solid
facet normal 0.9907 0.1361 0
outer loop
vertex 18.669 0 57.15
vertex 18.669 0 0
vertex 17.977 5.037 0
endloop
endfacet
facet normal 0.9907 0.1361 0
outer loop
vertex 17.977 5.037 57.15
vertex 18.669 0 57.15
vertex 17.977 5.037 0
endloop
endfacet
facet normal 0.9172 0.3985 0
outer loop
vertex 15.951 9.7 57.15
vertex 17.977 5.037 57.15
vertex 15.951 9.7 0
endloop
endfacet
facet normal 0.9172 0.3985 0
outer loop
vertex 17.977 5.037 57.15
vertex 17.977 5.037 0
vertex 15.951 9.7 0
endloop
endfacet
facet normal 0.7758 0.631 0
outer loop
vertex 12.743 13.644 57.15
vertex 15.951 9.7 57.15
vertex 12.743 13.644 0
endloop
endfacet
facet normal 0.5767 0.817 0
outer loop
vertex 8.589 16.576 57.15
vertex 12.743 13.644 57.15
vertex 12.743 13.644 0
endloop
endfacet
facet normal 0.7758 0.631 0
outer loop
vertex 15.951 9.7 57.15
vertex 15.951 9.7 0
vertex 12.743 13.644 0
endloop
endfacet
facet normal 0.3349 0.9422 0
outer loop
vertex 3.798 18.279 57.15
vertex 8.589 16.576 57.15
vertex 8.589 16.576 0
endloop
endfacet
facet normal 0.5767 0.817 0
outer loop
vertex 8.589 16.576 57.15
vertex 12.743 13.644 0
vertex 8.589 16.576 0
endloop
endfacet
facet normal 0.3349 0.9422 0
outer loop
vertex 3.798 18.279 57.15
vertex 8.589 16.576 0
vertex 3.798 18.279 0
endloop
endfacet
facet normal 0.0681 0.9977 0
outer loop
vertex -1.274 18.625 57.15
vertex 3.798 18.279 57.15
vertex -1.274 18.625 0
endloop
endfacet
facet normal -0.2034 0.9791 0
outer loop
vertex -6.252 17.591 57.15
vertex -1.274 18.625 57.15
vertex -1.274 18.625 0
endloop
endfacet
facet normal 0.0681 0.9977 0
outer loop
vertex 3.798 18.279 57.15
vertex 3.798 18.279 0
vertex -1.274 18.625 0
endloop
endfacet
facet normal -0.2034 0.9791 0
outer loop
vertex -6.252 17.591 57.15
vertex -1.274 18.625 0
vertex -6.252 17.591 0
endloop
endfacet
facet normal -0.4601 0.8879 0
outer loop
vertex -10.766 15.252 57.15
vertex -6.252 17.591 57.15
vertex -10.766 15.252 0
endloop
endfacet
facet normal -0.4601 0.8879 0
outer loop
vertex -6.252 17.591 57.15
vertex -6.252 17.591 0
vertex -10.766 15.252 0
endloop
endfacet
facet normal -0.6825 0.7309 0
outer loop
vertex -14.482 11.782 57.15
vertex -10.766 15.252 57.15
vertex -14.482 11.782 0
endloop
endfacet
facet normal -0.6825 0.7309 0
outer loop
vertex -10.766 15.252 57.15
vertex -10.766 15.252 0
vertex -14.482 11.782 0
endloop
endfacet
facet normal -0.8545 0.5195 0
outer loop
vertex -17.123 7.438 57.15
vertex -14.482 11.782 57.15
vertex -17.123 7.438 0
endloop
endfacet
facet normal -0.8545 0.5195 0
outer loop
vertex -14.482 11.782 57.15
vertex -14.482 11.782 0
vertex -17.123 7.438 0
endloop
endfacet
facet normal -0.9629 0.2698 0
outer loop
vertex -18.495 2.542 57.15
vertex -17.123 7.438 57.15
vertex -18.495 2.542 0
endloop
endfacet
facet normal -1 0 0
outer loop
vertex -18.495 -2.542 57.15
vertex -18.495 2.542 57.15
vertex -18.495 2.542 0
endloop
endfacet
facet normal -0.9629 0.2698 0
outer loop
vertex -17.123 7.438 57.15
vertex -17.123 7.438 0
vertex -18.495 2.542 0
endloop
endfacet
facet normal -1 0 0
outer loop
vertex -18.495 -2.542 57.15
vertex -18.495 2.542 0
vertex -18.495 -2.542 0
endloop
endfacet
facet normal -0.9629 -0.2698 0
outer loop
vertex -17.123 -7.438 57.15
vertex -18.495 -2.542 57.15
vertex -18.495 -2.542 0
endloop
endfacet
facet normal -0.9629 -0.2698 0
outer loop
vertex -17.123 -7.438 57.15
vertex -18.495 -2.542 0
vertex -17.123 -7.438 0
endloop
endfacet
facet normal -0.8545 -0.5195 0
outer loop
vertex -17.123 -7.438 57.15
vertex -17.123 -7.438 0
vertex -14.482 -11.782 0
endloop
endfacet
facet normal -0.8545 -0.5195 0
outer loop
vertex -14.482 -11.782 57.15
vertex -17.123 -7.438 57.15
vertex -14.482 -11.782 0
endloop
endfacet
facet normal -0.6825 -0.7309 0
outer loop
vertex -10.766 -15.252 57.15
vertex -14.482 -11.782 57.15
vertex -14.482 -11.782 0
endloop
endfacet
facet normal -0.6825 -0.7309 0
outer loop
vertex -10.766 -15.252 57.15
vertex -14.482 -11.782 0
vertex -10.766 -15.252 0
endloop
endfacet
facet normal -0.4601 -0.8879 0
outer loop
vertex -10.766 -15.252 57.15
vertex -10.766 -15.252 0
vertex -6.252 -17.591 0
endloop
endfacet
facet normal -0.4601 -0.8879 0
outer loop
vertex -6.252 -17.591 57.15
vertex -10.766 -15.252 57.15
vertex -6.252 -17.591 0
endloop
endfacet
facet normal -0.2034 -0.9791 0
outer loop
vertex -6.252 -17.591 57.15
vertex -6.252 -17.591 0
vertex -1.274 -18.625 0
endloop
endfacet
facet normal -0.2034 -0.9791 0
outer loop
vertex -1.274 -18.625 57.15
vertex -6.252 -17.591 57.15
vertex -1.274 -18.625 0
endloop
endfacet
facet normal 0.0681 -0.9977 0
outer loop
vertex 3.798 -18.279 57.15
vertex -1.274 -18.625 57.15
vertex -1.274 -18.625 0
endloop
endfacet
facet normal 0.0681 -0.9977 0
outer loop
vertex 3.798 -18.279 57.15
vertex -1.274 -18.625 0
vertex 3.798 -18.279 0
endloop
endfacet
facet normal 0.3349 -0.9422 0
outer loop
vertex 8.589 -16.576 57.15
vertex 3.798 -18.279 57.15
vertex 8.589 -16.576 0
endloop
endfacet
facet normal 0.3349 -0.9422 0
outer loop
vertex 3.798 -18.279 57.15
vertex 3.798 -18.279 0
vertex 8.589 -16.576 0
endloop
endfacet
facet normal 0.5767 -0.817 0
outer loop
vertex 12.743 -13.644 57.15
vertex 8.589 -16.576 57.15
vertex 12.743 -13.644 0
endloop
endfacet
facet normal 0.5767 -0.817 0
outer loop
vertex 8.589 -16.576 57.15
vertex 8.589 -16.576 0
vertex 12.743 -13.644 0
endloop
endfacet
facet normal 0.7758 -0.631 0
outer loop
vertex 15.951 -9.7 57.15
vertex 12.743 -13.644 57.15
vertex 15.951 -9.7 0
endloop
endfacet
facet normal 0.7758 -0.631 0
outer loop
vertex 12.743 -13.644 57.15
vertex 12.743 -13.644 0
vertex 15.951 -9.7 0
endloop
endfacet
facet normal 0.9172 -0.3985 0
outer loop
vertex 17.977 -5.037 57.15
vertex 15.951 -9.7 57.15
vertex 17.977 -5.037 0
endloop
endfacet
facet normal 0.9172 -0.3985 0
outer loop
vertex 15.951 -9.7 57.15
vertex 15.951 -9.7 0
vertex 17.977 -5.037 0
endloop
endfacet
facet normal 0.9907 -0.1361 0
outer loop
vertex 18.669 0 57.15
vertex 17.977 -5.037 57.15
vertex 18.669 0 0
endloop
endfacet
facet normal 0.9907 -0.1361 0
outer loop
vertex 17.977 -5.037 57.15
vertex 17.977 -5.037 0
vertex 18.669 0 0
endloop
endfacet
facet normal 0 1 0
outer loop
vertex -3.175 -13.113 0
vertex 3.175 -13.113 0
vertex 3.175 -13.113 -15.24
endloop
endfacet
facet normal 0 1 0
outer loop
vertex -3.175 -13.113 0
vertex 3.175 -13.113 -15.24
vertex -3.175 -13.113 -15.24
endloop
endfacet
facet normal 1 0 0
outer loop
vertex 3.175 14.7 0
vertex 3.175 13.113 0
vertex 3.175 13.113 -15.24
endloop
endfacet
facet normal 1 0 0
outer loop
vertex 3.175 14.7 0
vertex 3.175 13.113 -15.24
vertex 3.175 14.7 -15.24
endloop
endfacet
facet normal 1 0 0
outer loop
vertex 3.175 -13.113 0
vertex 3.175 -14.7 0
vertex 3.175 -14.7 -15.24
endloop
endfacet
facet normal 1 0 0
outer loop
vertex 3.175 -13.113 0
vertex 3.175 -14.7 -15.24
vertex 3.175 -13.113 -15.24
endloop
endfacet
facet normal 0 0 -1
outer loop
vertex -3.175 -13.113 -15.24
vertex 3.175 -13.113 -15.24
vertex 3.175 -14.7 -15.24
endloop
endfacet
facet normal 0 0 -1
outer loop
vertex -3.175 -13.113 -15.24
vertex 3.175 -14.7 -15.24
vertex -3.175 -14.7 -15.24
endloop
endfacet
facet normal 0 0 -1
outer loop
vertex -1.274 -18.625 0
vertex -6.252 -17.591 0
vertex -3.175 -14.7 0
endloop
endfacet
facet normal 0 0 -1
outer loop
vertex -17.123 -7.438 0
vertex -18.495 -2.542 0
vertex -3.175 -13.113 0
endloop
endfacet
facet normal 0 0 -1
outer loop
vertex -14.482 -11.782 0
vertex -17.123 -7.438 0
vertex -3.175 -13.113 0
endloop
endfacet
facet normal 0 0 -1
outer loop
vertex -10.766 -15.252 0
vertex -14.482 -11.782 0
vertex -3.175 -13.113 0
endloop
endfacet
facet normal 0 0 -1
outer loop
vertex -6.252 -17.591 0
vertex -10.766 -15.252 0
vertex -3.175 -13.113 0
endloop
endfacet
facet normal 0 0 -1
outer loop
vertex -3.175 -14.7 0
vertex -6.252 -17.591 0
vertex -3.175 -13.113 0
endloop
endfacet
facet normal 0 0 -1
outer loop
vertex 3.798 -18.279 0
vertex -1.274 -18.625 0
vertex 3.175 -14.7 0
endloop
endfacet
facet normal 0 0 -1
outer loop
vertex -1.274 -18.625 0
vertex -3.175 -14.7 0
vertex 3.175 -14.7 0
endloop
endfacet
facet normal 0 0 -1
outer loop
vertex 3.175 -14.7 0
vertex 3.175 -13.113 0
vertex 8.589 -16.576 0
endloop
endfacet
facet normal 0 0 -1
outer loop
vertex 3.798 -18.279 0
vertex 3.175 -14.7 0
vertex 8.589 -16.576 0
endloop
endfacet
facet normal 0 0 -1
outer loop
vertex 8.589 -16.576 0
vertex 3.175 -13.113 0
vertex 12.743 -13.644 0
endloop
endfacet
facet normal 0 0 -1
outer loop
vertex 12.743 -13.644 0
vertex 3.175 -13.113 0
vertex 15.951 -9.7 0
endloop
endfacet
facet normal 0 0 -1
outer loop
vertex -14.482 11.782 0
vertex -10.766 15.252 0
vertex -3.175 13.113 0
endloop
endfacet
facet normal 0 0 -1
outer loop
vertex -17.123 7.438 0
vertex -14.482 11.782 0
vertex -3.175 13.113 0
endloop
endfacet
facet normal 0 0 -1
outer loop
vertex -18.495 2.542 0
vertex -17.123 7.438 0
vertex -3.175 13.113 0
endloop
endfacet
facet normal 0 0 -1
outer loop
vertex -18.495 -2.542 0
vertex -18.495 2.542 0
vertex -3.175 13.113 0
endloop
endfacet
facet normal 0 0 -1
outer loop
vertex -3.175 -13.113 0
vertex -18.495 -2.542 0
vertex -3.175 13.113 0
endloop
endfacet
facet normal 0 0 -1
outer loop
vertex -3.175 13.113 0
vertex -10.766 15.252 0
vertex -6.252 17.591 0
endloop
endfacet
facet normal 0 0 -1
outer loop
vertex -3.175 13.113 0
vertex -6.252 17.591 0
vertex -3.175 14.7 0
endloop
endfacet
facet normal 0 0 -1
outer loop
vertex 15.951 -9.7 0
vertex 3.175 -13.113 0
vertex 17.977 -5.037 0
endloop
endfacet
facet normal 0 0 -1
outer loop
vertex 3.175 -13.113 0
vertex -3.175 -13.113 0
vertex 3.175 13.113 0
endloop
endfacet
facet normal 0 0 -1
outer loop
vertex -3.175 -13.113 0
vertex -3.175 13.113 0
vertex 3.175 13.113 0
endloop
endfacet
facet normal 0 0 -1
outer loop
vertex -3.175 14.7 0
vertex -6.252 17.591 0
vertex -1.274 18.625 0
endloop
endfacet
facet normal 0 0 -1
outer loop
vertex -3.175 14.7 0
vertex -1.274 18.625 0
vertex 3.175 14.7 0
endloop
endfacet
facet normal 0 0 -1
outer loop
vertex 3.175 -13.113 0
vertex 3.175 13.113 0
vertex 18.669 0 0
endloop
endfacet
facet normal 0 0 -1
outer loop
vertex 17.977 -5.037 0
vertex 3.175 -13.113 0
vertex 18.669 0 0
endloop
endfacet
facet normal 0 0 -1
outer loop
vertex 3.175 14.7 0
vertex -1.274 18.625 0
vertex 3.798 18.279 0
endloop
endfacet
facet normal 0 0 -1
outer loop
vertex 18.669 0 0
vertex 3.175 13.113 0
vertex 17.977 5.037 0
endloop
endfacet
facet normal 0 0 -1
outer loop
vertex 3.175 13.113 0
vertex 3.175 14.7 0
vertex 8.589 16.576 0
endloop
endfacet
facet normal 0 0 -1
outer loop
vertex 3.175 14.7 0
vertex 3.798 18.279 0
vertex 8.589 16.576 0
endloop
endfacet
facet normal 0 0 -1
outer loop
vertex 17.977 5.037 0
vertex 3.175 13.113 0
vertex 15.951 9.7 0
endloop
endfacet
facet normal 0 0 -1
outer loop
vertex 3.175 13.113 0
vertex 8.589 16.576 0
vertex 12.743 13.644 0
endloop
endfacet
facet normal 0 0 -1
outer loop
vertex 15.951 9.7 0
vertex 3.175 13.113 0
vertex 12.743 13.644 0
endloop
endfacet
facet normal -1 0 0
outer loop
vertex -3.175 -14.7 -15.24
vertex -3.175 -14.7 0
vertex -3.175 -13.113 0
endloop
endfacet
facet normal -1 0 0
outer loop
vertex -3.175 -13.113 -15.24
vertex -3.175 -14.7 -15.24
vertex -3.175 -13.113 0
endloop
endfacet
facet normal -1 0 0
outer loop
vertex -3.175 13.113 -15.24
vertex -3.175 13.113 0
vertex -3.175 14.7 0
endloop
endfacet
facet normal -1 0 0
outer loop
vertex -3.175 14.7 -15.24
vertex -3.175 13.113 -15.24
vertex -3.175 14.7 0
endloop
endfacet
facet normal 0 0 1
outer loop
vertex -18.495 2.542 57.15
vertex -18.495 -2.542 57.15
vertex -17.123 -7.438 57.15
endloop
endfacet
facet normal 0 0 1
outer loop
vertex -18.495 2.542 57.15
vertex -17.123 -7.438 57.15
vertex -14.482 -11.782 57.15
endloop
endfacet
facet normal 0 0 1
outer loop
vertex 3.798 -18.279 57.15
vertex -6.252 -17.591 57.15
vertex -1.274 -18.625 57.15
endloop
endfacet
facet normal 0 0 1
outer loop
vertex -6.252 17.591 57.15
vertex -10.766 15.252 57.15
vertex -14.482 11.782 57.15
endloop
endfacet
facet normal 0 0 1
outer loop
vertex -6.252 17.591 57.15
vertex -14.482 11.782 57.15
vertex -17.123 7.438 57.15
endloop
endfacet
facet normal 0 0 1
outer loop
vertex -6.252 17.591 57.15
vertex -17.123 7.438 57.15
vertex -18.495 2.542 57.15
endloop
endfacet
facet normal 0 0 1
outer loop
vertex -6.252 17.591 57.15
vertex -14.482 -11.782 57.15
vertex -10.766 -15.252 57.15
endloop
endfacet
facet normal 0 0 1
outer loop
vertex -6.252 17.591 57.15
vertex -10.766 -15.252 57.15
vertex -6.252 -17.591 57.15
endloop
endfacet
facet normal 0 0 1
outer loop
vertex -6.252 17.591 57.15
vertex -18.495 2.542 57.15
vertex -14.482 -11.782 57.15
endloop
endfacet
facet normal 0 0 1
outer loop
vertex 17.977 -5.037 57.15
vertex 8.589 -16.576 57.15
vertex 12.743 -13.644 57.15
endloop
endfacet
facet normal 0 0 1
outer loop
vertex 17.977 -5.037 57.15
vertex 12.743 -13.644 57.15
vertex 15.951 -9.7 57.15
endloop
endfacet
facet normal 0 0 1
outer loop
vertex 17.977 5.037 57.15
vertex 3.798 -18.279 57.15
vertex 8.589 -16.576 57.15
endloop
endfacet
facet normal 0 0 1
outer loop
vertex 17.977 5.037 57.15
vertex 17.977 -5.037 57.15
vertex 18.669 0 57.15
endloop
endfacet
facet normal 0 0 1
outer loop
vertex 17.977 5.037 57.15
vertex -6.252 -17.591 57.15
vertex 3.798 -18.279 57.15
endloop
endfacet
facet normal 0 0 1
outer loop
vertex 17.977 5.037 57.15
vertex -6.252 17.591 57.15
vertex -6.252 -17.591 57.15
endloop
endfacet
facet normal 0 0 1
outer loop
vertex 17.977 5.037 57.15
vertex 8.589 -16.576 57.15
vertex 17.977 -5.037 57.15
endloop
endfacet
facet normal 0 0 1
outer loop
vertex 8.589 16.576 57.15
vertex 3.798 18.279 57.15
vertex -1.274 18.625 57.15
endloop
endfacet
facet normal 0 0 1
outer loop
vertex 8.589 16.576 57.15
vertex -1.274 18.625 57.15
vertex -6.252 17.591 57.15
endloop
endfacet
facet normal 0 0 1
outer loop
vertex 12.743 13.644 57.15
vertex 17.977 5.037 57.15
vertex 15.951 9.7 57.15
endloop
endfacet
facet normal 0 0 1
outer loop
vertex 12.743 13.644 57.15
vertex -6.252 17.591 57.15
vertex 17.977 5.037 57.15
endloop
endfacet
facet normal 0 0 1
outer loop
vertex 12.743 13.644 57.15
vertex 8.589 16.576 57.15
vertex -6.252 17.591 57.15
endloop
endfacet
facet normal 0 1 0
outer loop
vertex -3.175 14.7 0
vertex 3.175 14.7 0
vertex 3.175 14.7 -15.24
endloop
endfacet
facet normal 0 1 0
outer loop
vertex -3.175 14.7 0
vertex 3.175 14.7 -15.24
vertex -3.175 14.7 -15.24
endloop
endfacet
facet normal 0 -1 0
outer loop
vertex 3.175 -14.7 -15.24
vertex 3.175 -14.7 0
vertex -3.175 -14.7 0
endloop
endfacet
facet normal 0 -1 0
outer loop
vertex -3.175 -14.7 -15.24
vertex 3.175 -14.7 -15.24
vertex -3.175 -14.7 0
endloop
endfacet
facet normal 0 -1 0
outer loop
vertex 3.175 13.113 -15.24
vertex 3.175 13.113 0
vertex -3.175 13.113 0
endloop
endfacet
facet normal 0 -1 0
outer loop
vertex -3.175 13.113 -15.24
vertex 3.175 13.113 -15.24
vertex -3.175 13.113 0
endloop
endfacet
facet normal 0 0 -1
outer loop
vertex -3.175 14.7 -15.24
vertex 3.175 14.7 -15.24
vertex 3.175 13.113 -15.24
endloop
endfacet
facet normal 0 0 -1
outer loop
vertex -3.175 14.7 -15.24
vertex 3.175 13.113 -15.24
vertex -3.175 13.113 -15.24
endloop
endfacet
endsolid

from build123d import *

# Parameters (mm, degrees)
SKETCH1_R           = 18.669
BOSS_EXTRUDE1_DEPTH = 57.15
SKETCH2_W           = 6.35
SKETCH2_H           = 1.5875
BOSS_EXTRUDE2_DEPTH = 15.24


with BuildPart() as part:
    # Sketch1 → Boss-Extrude1 (new body)
    with BuildSketch(Plane.XY):
        Circle(SKETCH1_R)
    extrude(amount=BOSS_EXTRUDE1_DEPTH)

    # Sketch2 → Boss-Extrude2 (add)
    with BuildSketch(Plane(origin=(0, 0, 0), x_dir=(-1, 0, 0), z_dir=(0, 0, -1))):
        with Locations((0, 13.9065)):
            Rectangle(SKETCH2_W, SKETCH2_H)
        with Locations((0, -13.9065)):
            Rectangle(SKETCH2_W, SKETCH2_H)
    extrude(amount=BOSS_EXTRUDE2_DEPTH)


solid = part.part
